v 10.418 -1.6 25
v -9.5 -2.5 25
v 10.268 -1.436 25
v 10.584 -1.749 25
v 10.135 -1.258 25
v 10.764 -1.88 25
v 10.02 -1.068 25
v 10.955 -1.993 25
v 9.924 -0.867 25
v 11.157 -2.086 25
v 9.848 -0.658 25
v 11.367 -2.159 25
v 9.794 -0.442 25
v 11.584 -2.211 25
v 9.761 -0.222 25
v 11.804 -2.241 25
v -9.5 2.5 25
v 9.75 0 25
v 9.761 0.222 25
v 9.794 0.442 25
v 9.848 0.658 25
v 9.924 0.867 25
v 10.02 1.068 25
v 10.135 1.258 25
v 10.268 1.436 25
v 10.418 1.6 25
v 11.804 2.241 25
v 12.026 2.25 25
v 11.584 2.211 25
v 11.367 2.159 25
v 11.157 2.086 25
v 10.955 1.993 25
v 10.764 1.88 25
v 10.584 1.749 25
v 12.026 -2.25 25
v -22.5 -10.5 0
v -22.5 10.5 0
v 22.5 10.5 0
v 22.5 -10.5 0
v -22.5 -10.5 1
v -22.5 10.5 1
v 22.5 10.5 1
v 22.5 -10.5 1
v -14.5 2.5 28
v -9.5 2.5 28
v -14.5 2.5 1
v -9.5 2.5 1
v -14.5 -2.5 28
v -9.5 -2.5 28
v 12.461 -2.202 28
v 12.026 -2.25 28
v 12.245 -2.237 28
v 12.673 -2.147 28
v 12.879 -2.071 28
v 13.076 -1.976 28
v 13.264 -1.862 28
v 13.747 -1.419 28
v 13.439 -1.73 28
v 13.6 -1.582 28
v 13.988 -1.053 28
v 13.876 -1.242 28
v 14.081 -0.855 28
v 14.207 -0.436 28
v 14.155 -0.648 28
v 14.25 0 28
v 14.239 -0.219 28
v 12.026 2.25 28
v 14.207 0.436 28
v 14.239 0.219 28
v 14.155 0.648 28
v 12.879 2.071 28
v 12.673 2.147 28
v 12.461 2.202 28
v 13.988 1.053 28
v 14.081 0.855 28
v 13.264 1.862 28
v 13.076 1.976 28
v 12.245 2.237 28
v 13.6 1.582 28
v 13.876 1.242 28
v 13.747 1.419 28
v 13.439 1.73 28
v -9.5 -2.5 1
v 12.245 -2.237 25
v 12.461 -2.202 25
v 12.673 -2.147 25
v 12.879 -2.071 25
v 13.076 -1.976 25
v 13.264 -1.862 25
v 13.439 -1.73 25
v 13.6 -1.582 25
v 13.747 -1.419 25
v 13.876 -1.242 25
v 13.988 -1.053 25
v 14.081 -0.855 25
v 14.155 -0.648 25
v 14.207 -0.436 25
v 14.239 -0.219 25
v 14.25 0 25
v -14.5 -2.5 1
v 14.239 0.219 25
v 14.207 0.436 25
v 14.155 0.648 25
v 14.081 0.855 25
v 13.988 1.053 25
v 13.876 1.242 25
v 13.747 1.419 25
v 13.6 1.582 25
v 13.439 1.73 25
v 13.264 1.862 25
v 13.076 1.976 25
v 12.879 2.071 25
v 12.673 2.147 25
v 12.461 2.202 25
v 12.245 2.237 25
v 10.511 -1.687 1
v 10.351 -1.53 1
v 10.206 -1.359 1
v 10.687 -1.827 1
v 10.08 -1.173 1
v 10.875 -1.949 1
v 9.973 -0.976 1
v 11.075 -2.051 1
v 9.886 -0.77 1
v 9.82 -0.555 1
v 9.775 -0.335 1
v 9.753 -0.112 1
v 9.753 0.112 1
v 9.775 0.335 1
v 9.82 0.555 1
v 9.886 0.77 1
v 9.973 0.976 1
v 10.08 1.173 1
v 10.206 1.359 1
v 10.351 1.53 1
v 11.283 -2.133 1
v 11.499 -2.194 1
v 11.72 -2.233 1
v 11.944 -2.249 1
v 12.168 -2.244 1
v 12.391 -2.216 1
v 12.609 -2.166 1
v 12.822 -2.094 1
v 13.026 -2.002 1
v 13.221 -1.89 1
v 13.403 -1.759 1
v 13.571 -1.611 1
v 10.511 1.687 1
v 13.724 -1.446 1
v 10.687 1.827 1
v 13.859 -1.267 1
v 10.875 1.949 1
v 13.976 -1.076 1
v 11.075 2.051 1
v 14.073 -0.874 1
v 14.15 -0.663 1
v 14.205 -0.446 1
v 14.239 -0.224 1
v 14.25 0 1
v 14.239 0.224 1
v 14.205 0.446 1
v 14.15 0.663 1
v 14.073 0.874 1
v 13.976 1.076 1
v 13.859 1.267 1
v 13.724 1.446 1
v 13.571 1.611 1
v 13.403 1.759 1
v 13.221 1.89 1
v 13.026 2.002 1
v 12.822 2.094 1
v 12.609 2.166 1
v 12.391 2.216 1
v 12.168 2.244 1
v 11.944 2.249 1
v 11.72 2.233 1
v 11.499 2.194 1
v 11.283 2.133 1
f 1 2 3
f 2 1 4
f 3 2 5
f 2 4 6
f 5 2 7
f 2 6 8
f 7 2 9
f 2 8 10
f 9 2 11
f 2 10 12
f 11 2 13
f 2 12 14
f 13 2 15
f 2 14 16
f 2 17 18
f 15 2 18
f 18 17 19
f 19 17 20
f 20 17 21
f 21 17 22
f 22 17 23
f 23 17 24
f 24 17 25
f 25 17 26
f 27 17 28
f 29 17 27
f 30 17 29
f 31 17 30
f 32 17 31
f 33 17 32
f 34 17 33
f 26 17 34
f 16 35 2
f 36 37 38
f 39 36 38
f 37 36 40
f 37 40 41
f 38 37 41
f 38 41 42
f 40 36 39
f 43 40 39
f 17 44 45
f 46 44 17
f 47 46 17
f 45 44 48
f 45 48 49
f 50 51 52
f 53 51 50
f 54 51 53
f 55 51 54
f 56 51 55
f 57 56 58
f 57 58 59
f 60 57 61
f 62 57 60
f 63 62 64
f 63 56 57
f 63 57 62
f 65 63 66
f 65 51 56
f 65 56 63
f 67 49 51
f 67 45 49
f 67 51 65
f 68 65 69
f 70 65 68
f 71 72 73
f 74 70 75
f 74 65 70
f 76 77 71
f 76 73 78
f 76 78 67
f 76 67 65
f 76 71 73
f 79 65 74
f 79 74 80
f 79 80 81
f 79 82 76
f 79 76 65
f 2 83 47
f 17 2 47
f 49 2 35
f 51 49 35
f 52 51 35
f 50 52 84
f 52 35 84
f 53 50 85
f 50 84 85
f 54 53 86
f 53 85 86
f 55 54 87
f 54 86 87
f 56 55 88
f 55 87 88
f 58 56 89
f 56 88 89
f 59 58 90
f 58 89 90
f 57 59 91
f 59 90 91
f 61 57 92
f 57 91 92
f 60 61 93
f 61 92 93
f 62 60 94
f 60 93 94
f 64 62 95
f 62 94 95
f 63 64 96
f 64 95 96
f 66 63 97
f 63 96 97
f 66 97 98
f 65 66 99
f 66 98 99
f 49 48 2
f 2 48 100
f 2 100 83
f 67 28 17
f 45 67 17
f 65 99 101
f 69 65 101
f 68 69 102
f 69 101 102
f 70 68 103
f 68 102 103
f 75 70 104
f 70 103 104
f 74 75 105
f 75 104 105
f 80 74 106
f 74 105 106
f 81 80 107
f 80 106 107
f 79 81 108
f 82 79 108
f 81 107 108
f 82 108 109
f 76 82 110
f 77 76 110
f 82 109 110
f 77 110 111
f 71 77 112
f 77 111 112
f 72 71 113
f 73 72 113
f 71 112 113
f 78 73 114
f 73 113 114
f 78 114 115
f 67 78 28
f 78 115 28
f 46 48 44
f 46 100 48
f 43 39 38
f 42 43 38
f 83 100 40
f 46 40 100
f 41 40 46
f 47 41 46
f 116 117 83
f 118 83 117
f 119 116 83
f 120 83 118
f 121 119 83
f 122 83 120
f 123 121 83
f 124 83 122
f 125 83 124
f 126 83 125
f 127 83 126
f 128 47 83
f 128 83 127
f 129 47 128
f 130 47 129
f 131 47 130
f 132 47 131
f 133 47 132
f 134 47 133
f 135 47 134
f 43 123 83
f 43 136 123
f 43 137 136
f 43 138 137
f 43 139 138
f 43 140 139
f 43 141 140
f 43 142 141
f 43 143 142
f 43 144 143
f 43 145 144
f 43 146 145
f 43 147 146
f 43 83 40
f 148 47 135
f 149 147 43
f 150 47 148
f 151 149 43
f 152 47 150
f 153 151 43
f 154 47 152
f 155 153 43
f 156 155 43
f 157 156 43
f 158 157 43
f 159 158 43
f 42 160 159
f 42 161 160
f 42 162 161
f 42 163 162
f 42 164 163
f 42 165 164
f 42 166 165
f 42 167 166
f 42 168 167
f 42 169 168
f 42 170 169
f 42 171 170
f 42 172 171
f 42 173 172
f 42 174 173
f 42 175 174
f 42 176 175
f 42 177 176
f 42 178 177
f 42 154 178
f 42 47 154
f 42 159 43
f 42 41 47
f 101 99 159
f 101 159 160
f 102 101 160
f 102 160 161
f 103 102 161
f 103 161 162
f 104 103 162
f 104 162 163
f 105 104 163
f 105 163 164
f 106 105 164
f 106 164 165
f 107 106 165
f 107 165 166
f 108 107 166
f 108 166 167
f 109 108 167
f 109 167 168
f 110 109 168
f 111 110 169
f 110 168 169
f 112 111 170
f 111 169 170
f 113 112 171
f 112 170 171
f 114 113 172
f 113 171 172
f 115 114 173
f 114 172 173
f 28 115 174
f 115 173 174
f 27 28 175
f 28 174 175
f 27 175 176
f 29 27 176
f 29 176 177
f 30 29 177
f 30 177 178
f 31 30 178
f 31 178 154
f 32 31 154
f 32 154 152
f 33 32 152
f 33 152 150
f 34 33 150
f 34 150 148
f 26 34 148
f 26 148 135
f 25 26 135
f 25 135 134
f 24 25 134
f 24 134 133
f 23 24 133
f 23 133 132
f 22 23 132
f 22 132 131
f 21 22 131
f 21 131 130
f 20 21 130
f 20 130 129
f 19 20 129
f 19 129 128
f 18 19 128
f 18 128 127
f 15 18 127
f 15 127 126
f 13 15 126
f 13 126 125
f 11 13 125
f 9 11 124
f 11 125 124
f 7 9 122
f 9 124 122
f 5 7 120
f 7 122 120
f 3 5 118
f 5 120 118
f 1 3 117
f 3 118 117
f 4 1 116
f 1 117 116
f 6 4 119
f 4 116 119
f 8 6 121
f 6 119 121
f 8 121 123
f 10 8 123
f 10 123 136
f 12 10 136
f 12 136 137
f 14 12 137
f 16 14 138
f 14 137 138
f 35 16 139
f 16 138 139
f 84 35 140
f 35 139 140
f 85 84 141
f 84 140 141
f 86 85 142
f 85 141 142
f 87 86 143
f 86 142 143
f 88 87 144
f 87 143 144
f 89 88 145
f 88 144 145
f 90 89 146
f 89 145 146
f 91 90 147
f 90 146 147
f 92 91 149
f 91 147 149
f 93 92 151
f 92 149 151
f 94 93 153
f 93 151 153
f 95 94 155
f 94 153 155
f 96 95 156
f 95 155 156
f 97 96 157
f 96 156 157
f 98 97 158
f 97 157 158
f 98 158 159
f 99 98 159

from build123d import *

# Parameters (mm, degrees)
F0_W     = 45
F0_H     = 21
F0_W_2   = 5
F0_H_2   = 5
F0_R     = 2.25
F1_DEPTH = 1
F2_DEPTH = 25
F3_W     = 5
F3_H     = 5
F4_DEPTH = 3


with BuildPart() as f1:
    # F0 (on Top) → F1 (new body)
    with BuildSketch(Plane.XY):
        Rectangle(F0_W, F0_H)
        with Locations((-12, 0)):
            Rectangle(F0_W_2, F0_H_2, mode=Mode.SUBTRACT)
        with Locations((12, 0)):
            Circle(F0_R, mode=Mode.SUBTRACT)
    extrude(amount=F1_DEPTH)

    # F0 (on Top) → F2 (join)
    with BuildSketch(Plane.XY):
        with Locations((-12, 0)):
            Rectangle(F0_W_2, F0_H_2)
        with Locations((12, 0)):
            Circle(F0_R)
    extrude(amount=F2_DEPTH)

    # F3 (on face) → F4 (join)
    with BuildSketch(Plane.XY.offset(25)):
        with BuildLine():
            Line((12.026145, 2.249848), (-9.5, 2.5))
            Line((-9.5, 2.5), (-9.5, -2.5))
            Line((-9.5, -2.5), (12.026145, -2.249848))
            ThreePointArc((12.026145, -2.249848), (9.75, 0), (12.026145, 2.249848))
        make_face()
        with Locations((-12, 0)):
            Rectangle(F3_W, F3_H)
        with BuildLine():
            ThreePointArc((14.25, 0), (13.600207, 1.58172), (12.026145, 2.249848))
            ThreePointArc((12.026145, 2.249848), (9.75, 0), (12.026145, -2.249848))
            ThreePointArc((12.026145, -2.249848), (13.600207, -1.58172), (14.25, 0))
        make_face()
    extrude(amount=F4_DEPTH)


solid = f1.part
